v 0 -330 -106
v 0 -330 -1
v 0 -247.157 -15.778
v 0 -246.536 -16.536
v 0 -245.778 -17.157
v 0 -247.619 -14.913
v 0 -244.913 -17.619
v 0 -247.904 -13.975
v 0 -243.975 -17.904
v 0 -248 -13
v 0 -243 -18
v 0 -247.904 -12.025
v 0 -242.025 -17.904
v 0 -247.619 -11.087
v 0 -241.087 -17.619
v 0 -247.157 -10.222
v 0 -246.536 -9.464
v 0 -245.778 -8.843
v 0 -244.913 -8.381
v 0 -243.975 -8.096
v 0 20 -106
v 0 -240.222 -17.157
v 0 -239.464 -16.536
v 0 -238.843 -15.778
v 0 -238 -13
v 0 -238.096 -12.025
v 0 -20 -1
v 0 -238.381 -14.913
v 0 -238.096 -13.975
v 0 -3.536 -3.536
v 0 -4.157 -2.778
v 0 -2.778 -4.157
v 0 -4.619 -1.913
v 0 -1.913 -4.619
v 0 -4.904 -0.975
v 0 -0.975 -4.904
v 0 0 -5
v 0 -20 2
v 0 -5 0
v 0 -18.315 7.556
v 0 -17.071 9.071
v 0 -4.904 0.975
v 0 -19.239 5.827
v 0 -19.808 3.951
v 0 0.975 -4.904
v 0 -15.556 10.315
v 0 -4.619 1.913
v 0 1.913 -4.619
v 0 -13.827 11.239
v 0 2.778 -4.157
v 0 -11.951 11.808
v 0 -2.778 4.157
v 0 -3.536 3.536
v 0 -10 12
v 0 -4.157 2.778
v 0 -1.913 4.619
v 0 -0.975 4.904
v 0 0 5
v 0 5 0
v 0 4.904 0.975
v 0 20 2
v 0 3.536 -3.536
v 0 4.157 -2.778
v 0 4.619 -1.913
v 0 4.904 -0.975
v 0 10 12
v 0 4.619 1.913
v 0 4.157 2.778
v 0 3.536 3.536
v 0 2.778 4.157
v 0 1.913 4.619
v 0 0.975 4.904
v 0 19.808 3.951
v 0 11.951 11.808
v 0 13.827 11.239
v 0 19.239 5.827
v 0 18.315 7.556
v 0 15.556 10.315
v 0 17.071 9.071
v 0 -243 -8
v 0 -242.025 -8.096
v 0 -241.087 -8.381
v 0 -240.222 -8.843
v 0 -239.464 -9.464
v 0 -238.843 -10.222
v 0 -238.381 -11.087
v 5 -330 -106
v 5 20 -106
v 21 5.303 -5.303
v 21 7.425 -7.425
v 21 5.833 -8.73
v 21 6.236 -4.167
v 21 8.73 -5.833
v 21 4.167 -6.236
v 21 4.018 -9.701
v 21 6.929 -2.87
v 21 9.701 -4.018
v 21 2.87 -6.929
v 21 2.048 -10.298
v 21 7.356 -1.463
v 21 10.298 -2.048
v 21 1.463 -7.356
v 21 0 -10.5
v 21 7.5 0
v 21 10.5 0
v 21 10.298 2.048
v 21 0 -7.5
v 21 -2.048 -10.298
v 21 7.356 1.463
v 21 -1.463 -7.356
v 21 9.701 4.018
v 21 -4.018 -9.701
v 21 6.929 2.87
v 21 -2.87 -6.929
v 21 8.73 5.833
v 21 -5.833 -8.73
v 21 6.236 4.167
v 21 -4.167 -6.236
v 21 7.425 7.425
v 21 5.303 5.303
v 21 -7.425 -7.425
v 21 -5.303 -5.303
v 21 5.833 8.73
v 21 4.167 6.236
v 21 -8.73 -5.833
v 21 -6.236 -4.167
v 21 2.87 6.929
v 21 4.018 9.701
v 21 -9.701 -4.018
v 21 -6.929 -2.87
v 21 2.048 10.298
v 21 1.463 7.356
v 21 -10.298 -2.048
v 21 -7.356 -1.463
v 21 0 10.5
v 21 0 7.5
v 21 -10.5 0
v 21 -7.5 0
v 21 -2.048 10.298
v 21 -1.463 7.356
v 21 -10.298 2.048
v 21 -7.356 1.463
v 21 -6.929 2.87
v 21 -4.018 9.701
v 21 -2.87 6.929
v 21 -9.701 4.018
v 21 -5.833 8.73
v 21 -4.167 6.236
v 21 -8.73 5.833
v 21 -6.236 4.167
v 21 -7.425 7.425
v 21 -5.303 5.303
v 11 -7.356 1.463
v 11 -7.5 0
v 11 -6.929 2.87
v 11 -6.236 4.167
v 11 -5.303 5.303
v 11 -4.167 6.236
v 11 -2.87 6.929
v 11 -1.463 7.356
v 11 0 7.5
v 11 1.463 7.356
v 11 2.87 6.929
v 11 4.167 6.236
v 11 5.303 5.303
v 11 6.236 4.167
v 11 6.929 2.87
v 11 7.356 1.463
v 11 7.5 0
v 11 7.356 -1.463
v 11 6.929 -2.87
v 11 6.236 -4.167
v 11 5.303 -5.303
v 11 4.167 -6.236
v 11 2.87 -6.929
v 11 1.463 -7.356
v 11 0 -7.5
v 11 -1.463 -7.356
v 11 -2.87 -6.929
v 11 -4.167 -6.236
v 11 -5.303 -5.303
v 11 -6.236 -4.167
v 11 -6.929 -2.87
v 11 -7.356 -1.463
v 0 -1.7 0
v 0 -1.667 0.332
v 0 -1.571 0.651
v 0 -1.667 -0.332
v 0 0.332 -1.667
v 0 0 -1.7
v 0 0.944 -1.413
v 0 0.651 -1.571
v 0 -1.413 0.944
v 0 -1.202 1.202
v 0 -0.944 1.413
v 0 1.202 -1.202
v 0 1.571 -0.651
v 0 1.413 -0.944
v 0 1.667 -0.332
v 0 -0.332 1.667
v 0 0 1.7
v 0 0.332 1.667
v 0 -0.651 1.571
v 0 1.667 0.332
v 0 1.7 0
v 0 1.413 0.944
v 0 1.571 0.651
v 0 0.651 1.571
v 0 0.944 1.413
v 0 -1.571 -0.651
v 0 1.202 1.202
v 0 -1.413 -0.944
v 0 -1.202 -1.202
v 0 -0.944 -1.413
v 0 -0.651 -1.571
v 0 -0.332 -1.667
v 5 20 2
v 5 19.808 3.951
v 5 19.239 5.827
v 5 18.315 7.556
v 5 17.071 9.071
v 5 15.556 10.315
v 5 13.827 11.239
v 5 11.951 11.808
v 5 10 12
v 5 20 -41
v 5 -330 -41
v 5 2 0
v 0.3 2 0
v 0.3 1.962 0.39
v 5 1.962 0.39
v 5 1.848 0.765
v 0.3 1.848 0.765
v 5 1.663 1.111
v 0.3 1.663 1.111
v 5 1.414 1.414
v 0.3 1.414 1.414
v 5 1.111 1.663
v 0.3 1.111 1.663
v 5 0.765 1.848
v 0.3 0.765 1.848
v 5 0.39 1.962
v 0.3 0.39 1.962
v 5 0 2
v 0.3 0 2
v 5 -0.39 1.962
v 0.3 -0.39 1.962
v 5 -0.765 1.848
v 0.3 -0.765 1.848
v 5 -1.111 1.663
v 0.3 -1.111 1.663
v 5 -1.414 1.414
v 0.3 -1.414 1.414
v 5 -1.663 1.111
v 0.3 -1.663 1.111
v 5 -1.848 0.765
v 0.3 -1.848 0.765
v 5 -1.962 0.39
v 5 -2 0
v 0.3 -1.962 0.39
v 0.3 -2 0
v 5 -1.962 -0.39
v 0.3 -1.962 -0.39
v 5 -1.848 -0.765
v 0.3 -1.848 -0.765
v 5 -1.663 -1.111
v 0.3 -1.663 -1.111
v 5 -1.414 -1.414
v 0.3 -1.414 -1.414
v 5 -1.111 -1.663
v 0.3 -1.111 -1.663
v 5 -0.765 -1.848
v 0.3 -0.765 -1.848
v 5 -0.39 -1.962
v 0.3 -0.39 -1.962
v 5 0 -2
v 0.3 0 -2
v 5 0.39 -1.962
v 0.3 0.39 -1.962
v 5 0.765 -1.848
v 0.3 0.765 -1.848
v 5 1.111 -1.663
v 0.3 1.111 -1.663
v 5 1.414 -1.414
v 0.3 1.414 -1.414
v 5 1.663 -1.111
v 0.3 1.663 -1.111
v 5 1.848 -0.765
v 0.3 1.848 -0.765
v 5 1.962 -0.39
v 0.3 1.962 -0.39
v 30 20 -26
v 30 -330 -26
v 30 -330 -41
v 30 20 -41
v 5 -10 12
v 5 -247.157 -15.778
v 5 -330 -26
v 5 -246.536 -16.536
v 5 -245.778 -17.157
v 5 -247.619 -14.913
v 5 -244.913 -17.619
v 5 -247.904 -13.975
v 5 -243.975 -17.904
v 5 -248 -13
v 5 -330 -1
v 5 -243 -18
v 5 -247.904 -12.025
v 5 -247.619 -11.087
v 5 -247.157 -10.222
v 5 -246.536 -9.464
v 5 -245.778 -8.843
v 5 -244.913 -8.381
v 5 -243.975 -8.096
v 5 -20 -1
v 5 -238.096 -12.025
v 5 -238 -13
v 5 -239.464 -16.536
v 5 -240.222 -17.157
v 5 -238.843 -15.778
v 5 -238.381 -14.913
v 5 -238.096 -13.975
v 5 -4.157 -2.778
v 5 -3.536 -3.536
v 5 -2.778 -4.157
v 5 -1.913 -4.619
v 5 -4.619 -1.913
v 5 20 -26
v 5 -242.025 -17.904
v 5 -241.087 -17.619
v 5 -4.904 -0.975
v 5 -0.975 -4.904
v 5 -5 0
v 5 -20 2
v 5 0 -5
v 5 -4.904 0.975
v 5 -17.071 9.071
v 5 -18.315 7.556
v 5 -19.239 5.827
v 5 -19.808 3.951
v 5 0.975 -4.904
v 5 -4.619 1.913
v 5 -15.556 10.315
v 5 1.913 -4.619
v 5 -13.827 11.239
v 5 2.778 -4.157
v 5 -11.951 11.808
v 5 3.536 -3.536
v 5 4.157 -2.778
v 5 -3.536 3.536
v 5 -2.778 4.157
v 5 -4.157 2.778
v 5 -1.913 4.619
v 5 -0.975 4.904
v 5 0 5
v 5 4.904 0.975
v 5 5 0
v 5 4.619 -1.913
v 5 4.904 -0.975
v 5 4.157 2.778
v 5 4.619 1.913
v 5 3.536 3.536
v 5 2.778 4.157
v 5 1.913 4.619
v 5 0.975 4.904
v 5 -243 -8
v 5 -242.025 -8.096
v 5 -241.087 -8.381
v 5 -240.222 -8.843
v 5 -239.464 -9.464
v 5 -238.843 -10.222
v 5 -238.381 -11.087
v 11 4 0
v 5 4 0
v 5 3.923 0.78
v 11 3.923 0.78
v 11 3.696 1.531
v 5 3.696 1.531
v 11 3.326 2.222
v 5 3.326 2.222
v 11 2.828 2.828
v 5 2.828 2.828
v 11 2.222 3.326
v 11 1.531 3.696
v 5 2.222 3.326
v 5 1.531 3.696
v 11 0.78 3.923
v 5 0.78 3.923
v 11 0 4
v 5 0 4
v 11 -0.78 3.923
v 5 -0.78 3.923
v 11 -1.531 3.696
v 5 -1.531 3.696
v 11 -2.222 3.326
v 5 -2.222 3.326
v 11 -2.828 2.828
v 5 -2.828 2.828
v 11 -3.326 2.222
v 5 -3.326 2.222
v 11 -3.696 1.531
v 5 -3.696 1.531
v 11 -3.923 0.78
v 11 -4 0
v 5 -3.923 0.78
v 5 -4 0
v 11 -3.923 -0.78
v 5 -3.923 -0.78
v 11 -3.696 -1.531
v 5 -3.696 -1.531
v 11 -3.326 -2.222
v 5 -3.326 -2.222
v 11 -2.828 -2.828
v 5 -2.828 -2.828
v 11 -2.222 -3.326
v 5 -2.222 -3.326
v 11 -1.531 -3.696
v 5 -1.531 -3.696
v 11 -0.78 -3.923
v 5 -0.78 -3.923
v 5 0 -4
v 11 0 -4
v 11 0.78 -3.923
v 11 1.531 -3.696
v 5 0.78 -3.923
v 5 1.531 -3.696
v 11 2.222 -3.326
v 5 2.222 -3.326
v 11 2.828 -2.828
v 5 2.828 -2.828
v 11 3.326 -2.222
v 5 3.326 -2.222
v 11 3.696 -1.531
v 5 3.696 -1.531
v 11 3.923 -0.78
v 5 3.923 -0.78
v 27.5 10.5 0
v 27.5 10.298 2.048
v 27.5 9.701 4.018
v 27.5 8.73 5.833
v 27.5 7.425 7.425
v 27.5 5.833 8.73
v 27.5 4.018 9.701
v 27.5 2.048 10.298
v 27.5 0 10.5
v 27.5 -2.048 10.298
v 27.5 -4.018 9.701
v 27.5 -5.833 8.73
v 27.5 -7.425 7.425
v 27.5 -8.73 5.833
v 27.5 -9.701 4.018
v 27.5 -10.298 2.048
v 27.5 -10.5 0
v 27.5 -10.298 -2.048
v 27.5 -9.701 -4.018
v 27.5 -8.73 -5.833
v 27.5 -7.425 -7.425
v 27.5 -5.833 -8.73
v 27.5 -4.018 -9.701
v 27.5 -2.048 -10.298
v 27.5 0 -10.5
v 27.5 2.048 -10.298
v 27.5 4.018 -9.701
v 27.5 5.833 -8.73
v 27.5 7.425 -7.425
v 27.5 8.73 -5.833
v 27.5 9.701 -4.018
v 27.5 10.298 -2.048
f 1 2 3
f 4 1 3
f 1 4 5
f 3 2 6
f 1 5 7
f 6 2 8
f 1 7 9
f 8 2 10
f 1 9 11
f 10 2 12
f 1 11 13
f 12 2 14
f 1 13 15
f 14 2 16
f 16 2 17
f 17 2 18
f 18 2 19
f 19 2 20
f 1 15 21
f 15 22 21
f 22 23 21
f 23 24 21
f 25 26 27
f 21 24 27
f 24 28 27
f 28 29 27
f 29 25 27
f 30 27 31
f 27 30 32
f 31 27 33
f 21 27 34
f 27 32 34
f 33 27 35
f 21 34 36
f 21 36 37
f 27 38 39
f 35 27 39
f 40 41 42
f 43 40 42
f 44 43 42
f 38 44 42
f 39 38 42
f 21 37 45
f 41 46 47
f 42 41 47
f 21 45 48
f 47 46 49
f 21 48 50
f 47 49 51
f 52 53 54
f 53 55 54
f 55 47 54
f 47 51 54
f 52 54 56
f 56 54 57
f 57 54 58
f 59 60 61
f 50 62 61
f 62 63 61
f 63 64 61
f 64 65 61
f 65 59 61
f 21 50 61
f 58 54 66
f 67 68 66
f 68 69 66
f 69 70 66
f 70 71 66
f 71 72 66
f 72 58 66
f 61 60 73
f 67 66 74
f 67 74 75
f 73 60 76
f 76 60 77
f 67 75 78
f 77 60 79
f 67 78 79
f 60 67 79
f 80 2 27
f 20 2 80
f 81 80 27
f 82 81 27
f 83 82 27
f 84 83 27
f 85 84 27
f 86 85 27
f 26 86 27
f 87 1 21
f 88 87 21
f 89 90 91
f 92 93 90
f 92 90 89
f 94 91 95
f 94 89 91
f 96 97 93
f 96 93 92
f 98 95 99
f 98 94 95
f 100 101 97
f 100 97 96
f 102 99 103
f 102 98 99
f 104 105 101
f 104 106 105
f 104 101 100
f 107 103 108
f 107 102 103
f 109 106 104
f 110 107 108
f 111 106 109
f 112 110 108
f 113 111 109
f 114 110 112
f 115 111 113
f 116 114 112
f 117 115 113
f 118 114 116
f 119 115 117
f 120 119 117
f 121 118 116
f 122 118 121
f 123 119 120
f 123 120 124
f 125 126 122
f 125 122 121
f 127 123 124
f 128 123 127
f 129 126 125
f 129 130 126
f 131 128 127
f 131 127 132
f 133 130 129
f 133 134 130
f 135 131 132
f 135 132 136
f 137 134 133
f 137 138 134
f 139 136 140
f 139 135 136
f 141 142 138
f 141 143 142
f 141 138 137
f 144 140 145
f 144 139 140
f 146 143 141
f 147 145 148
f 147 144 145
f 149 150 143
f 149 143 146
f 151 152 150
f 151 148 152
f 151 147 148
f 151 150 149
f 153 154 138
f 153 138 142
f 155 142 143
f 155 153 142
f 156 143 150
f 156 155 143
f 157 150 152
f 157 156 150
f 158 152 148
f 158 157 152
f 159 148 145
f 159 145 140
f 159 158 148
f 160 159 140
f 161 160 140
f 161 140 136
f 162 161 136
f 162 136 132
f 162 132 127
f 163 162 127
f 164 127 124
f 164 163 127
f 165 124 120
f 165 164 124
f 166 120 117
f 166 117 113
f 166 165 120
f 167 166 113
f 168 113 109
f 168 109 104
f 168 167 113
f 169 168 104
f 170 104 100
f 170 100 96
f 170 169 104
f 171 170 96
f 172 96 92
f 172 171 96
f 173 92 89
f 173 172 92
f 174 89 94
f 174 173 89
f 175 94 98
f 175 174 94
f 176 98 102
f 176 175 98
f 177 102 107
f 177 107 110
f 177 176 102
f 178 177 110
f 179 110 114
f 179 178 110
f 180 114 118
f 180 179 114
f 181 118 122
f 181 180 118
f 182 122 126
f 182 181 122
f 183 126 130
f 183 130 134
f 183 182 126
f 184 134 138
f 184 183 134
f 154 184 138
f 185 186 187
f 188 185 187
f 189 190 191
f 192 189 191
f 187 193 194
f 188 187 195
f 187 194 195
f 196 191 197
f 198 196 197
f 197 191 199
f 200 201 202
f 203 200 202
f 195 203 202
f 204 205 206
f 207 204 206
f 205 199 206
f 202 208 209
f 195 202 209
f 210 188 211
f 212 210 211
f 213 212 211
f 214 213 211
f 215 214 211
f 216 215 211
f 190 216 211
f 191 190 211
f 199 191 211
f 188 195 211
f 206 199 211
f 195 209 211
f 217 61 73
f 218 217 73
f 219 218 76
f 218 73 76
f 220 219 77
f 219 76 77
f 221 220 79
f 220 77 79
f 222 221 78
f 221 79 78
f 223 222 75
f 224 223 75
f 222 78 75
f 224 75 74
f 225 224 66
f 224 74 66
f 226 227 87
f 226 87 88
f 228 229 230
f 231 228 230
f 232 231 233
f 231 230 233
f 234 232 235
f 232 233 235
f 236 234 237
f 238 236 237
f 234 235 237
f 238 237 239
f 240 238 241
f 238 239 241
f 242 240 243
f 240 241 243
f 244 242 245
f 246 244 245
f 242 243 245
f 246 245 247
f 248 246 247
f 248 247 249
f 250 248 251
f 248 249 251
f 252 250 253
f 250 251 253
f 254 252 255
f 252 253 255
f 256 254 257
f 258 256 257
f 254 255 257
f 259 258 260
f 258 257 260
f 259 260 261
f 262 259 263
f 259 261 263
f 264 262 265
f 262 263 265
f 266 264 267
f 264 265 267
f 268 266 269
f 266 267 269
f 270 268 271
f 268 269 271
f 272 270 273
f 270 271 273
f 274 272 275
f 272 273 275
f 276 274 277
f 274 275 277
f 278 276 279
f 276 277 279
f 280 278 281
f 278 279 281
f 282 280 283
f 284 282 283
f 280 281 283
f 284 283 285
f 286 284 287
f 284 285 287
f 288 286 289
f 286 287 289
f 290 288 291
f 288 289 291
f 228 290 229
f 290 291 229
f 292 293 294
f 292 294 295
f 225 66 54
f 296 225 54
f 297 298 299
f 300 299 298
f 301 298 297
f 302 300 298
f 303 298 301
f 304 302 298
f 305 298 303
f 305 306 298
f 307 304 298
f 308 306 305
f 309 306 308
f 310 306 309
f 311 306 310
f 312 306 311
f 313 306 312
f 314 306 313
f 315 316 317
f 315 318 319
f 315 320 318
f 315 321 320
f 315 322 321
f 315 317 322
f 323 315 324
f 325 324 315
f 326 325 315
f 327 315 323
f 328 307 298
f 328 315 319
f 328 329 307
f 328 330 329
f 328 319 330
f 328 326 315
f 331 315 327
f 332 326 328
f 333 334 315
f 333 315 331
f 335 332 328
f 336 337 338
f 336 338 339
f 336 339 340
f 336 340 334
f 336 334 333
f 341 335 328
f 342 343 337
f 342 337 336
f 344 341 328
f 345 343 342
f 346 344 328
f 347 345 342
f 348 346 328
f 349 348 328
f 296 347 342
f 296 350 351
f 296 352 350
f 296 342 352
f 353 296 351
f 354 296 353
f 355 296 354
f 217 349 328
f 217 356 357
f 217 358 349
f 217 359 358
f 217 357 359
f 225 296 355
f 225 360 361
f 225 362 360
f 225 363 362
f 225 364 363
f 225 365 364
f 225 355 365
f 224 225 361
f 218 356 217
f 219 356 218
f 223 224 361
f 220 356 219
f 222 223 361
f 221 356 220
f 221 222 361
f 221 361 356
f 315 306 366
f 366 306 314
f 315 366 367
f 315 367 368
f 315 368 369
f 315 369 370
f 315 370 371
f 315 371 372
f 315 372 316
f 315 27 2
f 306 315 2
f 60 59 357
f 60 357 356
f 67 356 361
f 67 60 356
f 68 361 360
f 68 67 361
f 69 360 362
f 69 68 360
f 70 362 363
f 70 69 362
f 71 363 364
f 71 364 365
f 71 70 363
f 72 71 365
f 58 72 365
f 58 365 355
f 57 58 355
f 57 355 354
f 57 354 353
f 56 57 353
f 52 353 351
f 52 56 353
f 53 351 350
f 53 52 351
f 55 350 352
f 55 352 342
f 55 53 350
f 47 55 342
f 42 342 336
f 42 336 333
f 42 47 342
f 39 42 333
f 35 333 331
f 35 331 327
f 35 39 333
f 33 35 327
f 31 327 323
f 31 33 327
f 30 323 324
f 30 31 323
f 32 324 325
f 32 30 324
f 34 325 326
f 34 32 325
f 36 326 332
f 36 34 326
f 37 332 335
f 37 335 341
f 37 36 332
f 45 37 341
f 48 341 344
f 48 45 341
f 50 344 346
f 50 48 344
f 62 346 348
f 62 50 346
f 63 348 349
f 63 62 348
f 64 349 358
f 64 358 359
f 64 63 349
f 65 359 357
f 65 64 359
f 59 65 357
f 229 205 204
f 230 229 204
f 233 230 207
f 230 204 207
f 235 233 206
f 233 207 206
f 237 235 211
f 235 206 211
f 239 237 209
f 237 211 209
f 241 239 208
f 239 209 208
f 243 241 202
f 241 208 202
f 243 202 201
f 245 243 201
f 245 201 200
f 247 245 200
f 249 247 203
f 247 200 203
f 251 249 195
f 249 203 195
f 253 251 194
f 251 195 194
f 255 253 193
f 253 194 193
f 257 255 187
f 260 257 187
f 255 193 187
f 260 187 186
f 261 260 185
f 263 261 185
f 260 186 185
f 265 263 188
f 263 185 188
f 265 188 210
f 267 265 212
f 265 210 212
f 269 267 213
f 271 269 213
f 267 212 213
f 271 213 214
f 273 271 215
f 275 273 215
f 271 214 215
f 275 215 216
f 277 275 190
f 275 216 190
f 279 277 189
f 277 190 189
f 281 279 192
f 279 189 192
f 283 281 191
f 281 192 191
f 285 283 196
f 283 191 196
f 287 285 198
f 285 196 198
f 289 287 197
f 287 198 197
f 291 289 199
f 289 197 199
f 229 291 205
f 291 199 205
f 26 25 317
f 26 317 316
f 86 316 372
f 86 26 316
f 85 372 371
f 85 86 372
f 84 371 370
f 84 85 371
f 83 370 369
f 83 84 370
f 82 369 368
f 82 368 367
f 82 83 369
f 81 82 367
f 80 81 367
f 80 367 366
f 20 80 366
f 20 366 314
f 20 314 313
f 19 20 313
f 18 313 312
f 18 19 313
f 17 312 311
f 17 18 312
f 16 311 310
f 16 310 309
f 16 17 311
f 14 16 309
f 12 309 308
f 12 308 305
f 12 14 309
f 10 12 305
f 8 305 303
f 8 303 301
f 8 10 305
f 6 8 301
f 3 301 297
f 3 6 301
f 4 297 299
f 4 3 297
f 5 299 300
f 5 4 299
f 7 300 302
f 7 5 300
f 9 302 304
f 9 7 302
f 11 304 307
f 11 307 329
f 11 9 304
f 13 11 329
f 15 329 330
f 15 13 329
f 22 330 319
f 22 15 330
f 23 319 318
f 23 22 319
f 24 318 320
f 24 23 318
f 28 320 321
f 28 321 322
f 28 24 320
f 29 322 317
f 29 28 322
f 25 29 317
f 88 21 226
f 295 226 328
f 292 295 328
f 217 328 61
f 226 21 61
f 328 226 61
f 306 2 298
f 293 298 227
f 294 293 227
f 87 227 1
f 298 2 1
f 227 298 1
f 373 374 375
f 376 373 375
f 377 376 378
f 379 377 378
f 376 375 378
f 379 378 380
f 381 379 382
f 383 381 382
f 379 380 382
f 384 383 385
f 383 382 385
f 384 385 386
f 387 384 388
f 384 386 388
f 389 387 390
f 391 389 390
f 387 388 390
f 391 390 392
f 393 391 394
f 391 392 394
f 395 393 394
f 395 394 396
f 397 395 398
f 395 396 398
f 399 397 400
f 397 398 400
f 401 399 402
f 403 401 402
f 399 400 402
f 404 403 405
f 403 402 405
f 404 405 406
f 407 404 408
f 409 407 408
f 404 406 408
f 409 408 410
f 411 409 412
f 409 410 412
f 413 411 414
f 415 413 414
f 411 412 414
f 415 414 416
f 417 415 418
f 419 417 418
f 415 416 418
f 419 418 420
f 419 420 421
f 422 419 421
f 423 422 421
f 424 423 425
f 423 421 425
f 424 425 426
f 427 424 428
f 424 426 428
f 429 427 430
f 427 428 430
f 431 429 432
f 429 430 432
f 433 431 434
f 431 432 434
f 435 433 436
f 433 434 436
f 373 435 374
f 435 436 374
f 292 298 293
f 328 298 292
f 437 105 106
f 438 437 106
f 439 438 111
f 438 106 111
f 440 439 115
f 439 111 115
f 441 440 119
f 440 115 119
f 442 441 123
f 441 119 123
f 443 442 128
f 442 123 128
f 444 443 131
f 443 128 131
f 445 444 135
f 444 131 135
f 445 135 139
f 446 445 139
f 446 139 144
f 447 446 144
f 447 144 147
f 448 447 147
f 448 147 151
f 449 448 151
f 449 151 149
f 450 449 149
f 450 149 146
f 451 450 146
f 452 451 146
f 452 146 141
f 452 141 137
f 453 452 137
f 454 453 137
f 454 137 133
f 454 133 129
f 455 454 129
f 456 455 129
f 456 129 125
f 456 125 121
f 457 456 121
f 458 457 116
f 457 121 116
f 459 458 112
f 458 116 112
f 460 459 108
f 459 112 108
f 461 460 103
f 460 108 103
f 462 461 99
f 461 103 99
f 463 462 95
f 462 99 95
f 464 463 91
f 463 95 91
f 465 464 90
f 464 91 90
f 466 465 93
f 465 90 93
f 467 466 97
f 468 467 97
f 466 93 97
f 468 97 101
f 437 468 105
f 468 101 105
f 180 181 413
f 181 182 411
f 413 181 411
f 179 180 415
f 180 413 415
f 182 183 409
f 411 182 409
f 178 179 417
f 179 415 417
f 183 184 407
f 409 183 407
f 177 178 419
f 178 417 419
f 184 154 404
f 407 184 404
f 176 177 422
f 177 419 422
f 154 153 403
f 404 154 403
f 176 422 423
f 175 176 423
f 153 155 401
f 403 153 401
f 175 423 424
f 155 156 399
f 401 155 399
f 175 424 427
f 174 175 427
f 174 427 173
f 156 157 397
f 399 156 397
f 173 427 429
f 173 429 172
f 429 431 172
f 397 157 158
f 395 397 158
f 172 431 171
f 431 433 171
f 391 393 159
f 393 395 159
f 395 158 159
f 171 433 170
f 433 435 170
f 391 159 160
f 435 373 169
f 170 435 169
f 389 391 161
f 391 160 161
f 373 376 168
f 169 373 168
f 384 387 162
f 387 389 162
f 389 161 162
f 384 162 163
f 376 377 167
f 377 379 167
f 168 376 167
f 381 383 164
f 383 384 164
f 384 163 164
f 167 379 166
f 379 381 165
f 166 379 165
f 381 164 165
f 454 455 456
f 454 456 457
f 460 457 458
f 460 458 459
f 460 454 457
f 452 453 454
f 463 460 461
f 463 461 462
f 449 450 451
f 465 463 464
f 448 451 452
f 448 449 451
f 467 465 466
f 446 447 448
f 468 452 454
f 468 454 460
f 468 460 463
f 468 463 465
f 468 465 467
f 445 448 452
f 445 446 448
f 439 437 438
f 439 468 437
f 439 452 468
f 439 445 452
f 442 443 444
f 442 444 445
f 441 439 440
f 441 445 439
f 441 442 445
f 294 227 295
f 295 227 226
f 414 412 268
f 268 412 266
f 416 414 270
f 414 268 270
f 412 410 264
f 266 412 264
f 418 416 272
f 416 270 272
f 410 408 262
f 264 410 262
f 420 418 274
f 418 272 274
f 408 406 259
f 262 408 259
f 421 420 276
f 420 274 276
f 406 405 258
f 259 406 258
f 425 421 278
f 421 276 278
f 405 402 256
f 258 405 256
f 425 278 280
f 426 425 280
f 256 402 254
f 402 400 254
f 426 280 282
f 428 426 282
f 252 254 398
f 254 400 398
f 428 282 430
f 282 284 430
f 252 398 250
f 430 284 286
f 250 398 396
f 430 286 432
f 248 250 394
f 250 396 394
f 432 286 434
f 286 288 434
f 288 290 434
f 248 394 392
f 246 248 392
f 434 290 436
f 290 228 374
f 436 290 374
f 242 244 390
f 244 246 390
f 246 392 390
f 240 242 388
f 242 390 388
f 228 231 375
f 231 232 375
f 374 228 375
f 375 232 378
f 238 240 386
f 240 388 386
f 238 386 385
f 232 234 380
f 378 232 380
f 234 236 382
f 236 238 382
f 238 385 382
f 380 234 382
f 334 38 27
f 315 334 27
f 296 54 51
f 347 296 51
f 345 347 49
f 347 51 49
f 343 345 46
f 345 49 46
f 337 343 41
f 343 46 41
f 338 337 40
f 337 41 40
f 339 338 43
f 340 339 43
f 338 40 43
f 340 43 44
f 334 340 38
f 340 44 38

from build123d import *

# Parameters (mm, degrees)
F0_R      = 5
F1_DEPTH  = 5
F2_W      = 350
F2_H      = 15
F3_DEPTH  = 25
F4_R      = 2
F5_DEPTH  = 5
F6_R      = 4
F7_DEPTH  = 6
F8_R      = 10.5
F9_DEPTH  = 16.5
F10_R     = 12.131936
F10_R_2   = 7.5
F11_DEPTH = 10
F12_SIZE  = 0.3


with BuildPart() as f1:
    # F0 (on Right) → F1 (new body)
    with BuildSketch(Plane.YZ):
        with BuildLine():
            Line((-20, -1), (-330, -1))
            Line((-330, -1), (-330, -106))
            Line((-330, -106), (20, -106))
            Line((20, -106), (20, 2))
            ThreePointArc((20, 2), (17.071068, 9.071068), (10, 12))
            Line((10, 12), (-10, 12))
            ThreePointArc((-10, 12), (-17.071068, 9.071068), (-20, 2))
            Line((-20, 2), (-20, -1))
        make_face()
        with Locations((-243, -13)):
            Circle(F0_R, mode=Mode.SUBTRACT)
        Circle(F0_R, mode=Mode.SUBTRACT)
    extrude(amount=F1_DEPTH)

    # F2 (on face) → F3 (join)
    with BuildSketch(Plane.YZ.offset(5)):
        with Locations((-155, -33.5)):
            Rectangle(F2_W, F2_H)
    extrude(amount=F3_DEPTH)


with BuildPart() as f5:
    # F4 (on Right) → F5 (new body)
    with BuildSketch(Plane.YZ):
        Circle(F4_R)
    extrude(amount=F5_DEPTH)

    # F6 (on face) → F7 (join)
    with BuildSketch(Plane.YZ.offset(5)):
        Circle(F6_R)
    extrude(amount=F7_DEPTH)

    # F8 (on face) → F9 (join)
    with BuildSketch(Plane.YZ.offset(11)):
        Circle(F8_R)
    extrude(amount=F9_DEPTH)

    # F10 (on face) → F11 (cut)
    with BuildSketch(Plane(origin=(11, 0, 0), x_dir=(0, -1, 0), z_dir=(-1, 0, 0))):
        Circle(F10_R)
        Circle(F10_R_2, mode=Mode.SUBTRACT)
    extrude(amount=-F11_DEPTH, mode=Mode.SUBTRACT)

    # F12
    f12_edges = [f5.edges().sort_by_distance(p)[0] for p in [
        (0, -2, 0),
    ]]
    chamfer(f12_edges, length=F12_SIZE)


solid = Compound([f1.part, f5.part])
